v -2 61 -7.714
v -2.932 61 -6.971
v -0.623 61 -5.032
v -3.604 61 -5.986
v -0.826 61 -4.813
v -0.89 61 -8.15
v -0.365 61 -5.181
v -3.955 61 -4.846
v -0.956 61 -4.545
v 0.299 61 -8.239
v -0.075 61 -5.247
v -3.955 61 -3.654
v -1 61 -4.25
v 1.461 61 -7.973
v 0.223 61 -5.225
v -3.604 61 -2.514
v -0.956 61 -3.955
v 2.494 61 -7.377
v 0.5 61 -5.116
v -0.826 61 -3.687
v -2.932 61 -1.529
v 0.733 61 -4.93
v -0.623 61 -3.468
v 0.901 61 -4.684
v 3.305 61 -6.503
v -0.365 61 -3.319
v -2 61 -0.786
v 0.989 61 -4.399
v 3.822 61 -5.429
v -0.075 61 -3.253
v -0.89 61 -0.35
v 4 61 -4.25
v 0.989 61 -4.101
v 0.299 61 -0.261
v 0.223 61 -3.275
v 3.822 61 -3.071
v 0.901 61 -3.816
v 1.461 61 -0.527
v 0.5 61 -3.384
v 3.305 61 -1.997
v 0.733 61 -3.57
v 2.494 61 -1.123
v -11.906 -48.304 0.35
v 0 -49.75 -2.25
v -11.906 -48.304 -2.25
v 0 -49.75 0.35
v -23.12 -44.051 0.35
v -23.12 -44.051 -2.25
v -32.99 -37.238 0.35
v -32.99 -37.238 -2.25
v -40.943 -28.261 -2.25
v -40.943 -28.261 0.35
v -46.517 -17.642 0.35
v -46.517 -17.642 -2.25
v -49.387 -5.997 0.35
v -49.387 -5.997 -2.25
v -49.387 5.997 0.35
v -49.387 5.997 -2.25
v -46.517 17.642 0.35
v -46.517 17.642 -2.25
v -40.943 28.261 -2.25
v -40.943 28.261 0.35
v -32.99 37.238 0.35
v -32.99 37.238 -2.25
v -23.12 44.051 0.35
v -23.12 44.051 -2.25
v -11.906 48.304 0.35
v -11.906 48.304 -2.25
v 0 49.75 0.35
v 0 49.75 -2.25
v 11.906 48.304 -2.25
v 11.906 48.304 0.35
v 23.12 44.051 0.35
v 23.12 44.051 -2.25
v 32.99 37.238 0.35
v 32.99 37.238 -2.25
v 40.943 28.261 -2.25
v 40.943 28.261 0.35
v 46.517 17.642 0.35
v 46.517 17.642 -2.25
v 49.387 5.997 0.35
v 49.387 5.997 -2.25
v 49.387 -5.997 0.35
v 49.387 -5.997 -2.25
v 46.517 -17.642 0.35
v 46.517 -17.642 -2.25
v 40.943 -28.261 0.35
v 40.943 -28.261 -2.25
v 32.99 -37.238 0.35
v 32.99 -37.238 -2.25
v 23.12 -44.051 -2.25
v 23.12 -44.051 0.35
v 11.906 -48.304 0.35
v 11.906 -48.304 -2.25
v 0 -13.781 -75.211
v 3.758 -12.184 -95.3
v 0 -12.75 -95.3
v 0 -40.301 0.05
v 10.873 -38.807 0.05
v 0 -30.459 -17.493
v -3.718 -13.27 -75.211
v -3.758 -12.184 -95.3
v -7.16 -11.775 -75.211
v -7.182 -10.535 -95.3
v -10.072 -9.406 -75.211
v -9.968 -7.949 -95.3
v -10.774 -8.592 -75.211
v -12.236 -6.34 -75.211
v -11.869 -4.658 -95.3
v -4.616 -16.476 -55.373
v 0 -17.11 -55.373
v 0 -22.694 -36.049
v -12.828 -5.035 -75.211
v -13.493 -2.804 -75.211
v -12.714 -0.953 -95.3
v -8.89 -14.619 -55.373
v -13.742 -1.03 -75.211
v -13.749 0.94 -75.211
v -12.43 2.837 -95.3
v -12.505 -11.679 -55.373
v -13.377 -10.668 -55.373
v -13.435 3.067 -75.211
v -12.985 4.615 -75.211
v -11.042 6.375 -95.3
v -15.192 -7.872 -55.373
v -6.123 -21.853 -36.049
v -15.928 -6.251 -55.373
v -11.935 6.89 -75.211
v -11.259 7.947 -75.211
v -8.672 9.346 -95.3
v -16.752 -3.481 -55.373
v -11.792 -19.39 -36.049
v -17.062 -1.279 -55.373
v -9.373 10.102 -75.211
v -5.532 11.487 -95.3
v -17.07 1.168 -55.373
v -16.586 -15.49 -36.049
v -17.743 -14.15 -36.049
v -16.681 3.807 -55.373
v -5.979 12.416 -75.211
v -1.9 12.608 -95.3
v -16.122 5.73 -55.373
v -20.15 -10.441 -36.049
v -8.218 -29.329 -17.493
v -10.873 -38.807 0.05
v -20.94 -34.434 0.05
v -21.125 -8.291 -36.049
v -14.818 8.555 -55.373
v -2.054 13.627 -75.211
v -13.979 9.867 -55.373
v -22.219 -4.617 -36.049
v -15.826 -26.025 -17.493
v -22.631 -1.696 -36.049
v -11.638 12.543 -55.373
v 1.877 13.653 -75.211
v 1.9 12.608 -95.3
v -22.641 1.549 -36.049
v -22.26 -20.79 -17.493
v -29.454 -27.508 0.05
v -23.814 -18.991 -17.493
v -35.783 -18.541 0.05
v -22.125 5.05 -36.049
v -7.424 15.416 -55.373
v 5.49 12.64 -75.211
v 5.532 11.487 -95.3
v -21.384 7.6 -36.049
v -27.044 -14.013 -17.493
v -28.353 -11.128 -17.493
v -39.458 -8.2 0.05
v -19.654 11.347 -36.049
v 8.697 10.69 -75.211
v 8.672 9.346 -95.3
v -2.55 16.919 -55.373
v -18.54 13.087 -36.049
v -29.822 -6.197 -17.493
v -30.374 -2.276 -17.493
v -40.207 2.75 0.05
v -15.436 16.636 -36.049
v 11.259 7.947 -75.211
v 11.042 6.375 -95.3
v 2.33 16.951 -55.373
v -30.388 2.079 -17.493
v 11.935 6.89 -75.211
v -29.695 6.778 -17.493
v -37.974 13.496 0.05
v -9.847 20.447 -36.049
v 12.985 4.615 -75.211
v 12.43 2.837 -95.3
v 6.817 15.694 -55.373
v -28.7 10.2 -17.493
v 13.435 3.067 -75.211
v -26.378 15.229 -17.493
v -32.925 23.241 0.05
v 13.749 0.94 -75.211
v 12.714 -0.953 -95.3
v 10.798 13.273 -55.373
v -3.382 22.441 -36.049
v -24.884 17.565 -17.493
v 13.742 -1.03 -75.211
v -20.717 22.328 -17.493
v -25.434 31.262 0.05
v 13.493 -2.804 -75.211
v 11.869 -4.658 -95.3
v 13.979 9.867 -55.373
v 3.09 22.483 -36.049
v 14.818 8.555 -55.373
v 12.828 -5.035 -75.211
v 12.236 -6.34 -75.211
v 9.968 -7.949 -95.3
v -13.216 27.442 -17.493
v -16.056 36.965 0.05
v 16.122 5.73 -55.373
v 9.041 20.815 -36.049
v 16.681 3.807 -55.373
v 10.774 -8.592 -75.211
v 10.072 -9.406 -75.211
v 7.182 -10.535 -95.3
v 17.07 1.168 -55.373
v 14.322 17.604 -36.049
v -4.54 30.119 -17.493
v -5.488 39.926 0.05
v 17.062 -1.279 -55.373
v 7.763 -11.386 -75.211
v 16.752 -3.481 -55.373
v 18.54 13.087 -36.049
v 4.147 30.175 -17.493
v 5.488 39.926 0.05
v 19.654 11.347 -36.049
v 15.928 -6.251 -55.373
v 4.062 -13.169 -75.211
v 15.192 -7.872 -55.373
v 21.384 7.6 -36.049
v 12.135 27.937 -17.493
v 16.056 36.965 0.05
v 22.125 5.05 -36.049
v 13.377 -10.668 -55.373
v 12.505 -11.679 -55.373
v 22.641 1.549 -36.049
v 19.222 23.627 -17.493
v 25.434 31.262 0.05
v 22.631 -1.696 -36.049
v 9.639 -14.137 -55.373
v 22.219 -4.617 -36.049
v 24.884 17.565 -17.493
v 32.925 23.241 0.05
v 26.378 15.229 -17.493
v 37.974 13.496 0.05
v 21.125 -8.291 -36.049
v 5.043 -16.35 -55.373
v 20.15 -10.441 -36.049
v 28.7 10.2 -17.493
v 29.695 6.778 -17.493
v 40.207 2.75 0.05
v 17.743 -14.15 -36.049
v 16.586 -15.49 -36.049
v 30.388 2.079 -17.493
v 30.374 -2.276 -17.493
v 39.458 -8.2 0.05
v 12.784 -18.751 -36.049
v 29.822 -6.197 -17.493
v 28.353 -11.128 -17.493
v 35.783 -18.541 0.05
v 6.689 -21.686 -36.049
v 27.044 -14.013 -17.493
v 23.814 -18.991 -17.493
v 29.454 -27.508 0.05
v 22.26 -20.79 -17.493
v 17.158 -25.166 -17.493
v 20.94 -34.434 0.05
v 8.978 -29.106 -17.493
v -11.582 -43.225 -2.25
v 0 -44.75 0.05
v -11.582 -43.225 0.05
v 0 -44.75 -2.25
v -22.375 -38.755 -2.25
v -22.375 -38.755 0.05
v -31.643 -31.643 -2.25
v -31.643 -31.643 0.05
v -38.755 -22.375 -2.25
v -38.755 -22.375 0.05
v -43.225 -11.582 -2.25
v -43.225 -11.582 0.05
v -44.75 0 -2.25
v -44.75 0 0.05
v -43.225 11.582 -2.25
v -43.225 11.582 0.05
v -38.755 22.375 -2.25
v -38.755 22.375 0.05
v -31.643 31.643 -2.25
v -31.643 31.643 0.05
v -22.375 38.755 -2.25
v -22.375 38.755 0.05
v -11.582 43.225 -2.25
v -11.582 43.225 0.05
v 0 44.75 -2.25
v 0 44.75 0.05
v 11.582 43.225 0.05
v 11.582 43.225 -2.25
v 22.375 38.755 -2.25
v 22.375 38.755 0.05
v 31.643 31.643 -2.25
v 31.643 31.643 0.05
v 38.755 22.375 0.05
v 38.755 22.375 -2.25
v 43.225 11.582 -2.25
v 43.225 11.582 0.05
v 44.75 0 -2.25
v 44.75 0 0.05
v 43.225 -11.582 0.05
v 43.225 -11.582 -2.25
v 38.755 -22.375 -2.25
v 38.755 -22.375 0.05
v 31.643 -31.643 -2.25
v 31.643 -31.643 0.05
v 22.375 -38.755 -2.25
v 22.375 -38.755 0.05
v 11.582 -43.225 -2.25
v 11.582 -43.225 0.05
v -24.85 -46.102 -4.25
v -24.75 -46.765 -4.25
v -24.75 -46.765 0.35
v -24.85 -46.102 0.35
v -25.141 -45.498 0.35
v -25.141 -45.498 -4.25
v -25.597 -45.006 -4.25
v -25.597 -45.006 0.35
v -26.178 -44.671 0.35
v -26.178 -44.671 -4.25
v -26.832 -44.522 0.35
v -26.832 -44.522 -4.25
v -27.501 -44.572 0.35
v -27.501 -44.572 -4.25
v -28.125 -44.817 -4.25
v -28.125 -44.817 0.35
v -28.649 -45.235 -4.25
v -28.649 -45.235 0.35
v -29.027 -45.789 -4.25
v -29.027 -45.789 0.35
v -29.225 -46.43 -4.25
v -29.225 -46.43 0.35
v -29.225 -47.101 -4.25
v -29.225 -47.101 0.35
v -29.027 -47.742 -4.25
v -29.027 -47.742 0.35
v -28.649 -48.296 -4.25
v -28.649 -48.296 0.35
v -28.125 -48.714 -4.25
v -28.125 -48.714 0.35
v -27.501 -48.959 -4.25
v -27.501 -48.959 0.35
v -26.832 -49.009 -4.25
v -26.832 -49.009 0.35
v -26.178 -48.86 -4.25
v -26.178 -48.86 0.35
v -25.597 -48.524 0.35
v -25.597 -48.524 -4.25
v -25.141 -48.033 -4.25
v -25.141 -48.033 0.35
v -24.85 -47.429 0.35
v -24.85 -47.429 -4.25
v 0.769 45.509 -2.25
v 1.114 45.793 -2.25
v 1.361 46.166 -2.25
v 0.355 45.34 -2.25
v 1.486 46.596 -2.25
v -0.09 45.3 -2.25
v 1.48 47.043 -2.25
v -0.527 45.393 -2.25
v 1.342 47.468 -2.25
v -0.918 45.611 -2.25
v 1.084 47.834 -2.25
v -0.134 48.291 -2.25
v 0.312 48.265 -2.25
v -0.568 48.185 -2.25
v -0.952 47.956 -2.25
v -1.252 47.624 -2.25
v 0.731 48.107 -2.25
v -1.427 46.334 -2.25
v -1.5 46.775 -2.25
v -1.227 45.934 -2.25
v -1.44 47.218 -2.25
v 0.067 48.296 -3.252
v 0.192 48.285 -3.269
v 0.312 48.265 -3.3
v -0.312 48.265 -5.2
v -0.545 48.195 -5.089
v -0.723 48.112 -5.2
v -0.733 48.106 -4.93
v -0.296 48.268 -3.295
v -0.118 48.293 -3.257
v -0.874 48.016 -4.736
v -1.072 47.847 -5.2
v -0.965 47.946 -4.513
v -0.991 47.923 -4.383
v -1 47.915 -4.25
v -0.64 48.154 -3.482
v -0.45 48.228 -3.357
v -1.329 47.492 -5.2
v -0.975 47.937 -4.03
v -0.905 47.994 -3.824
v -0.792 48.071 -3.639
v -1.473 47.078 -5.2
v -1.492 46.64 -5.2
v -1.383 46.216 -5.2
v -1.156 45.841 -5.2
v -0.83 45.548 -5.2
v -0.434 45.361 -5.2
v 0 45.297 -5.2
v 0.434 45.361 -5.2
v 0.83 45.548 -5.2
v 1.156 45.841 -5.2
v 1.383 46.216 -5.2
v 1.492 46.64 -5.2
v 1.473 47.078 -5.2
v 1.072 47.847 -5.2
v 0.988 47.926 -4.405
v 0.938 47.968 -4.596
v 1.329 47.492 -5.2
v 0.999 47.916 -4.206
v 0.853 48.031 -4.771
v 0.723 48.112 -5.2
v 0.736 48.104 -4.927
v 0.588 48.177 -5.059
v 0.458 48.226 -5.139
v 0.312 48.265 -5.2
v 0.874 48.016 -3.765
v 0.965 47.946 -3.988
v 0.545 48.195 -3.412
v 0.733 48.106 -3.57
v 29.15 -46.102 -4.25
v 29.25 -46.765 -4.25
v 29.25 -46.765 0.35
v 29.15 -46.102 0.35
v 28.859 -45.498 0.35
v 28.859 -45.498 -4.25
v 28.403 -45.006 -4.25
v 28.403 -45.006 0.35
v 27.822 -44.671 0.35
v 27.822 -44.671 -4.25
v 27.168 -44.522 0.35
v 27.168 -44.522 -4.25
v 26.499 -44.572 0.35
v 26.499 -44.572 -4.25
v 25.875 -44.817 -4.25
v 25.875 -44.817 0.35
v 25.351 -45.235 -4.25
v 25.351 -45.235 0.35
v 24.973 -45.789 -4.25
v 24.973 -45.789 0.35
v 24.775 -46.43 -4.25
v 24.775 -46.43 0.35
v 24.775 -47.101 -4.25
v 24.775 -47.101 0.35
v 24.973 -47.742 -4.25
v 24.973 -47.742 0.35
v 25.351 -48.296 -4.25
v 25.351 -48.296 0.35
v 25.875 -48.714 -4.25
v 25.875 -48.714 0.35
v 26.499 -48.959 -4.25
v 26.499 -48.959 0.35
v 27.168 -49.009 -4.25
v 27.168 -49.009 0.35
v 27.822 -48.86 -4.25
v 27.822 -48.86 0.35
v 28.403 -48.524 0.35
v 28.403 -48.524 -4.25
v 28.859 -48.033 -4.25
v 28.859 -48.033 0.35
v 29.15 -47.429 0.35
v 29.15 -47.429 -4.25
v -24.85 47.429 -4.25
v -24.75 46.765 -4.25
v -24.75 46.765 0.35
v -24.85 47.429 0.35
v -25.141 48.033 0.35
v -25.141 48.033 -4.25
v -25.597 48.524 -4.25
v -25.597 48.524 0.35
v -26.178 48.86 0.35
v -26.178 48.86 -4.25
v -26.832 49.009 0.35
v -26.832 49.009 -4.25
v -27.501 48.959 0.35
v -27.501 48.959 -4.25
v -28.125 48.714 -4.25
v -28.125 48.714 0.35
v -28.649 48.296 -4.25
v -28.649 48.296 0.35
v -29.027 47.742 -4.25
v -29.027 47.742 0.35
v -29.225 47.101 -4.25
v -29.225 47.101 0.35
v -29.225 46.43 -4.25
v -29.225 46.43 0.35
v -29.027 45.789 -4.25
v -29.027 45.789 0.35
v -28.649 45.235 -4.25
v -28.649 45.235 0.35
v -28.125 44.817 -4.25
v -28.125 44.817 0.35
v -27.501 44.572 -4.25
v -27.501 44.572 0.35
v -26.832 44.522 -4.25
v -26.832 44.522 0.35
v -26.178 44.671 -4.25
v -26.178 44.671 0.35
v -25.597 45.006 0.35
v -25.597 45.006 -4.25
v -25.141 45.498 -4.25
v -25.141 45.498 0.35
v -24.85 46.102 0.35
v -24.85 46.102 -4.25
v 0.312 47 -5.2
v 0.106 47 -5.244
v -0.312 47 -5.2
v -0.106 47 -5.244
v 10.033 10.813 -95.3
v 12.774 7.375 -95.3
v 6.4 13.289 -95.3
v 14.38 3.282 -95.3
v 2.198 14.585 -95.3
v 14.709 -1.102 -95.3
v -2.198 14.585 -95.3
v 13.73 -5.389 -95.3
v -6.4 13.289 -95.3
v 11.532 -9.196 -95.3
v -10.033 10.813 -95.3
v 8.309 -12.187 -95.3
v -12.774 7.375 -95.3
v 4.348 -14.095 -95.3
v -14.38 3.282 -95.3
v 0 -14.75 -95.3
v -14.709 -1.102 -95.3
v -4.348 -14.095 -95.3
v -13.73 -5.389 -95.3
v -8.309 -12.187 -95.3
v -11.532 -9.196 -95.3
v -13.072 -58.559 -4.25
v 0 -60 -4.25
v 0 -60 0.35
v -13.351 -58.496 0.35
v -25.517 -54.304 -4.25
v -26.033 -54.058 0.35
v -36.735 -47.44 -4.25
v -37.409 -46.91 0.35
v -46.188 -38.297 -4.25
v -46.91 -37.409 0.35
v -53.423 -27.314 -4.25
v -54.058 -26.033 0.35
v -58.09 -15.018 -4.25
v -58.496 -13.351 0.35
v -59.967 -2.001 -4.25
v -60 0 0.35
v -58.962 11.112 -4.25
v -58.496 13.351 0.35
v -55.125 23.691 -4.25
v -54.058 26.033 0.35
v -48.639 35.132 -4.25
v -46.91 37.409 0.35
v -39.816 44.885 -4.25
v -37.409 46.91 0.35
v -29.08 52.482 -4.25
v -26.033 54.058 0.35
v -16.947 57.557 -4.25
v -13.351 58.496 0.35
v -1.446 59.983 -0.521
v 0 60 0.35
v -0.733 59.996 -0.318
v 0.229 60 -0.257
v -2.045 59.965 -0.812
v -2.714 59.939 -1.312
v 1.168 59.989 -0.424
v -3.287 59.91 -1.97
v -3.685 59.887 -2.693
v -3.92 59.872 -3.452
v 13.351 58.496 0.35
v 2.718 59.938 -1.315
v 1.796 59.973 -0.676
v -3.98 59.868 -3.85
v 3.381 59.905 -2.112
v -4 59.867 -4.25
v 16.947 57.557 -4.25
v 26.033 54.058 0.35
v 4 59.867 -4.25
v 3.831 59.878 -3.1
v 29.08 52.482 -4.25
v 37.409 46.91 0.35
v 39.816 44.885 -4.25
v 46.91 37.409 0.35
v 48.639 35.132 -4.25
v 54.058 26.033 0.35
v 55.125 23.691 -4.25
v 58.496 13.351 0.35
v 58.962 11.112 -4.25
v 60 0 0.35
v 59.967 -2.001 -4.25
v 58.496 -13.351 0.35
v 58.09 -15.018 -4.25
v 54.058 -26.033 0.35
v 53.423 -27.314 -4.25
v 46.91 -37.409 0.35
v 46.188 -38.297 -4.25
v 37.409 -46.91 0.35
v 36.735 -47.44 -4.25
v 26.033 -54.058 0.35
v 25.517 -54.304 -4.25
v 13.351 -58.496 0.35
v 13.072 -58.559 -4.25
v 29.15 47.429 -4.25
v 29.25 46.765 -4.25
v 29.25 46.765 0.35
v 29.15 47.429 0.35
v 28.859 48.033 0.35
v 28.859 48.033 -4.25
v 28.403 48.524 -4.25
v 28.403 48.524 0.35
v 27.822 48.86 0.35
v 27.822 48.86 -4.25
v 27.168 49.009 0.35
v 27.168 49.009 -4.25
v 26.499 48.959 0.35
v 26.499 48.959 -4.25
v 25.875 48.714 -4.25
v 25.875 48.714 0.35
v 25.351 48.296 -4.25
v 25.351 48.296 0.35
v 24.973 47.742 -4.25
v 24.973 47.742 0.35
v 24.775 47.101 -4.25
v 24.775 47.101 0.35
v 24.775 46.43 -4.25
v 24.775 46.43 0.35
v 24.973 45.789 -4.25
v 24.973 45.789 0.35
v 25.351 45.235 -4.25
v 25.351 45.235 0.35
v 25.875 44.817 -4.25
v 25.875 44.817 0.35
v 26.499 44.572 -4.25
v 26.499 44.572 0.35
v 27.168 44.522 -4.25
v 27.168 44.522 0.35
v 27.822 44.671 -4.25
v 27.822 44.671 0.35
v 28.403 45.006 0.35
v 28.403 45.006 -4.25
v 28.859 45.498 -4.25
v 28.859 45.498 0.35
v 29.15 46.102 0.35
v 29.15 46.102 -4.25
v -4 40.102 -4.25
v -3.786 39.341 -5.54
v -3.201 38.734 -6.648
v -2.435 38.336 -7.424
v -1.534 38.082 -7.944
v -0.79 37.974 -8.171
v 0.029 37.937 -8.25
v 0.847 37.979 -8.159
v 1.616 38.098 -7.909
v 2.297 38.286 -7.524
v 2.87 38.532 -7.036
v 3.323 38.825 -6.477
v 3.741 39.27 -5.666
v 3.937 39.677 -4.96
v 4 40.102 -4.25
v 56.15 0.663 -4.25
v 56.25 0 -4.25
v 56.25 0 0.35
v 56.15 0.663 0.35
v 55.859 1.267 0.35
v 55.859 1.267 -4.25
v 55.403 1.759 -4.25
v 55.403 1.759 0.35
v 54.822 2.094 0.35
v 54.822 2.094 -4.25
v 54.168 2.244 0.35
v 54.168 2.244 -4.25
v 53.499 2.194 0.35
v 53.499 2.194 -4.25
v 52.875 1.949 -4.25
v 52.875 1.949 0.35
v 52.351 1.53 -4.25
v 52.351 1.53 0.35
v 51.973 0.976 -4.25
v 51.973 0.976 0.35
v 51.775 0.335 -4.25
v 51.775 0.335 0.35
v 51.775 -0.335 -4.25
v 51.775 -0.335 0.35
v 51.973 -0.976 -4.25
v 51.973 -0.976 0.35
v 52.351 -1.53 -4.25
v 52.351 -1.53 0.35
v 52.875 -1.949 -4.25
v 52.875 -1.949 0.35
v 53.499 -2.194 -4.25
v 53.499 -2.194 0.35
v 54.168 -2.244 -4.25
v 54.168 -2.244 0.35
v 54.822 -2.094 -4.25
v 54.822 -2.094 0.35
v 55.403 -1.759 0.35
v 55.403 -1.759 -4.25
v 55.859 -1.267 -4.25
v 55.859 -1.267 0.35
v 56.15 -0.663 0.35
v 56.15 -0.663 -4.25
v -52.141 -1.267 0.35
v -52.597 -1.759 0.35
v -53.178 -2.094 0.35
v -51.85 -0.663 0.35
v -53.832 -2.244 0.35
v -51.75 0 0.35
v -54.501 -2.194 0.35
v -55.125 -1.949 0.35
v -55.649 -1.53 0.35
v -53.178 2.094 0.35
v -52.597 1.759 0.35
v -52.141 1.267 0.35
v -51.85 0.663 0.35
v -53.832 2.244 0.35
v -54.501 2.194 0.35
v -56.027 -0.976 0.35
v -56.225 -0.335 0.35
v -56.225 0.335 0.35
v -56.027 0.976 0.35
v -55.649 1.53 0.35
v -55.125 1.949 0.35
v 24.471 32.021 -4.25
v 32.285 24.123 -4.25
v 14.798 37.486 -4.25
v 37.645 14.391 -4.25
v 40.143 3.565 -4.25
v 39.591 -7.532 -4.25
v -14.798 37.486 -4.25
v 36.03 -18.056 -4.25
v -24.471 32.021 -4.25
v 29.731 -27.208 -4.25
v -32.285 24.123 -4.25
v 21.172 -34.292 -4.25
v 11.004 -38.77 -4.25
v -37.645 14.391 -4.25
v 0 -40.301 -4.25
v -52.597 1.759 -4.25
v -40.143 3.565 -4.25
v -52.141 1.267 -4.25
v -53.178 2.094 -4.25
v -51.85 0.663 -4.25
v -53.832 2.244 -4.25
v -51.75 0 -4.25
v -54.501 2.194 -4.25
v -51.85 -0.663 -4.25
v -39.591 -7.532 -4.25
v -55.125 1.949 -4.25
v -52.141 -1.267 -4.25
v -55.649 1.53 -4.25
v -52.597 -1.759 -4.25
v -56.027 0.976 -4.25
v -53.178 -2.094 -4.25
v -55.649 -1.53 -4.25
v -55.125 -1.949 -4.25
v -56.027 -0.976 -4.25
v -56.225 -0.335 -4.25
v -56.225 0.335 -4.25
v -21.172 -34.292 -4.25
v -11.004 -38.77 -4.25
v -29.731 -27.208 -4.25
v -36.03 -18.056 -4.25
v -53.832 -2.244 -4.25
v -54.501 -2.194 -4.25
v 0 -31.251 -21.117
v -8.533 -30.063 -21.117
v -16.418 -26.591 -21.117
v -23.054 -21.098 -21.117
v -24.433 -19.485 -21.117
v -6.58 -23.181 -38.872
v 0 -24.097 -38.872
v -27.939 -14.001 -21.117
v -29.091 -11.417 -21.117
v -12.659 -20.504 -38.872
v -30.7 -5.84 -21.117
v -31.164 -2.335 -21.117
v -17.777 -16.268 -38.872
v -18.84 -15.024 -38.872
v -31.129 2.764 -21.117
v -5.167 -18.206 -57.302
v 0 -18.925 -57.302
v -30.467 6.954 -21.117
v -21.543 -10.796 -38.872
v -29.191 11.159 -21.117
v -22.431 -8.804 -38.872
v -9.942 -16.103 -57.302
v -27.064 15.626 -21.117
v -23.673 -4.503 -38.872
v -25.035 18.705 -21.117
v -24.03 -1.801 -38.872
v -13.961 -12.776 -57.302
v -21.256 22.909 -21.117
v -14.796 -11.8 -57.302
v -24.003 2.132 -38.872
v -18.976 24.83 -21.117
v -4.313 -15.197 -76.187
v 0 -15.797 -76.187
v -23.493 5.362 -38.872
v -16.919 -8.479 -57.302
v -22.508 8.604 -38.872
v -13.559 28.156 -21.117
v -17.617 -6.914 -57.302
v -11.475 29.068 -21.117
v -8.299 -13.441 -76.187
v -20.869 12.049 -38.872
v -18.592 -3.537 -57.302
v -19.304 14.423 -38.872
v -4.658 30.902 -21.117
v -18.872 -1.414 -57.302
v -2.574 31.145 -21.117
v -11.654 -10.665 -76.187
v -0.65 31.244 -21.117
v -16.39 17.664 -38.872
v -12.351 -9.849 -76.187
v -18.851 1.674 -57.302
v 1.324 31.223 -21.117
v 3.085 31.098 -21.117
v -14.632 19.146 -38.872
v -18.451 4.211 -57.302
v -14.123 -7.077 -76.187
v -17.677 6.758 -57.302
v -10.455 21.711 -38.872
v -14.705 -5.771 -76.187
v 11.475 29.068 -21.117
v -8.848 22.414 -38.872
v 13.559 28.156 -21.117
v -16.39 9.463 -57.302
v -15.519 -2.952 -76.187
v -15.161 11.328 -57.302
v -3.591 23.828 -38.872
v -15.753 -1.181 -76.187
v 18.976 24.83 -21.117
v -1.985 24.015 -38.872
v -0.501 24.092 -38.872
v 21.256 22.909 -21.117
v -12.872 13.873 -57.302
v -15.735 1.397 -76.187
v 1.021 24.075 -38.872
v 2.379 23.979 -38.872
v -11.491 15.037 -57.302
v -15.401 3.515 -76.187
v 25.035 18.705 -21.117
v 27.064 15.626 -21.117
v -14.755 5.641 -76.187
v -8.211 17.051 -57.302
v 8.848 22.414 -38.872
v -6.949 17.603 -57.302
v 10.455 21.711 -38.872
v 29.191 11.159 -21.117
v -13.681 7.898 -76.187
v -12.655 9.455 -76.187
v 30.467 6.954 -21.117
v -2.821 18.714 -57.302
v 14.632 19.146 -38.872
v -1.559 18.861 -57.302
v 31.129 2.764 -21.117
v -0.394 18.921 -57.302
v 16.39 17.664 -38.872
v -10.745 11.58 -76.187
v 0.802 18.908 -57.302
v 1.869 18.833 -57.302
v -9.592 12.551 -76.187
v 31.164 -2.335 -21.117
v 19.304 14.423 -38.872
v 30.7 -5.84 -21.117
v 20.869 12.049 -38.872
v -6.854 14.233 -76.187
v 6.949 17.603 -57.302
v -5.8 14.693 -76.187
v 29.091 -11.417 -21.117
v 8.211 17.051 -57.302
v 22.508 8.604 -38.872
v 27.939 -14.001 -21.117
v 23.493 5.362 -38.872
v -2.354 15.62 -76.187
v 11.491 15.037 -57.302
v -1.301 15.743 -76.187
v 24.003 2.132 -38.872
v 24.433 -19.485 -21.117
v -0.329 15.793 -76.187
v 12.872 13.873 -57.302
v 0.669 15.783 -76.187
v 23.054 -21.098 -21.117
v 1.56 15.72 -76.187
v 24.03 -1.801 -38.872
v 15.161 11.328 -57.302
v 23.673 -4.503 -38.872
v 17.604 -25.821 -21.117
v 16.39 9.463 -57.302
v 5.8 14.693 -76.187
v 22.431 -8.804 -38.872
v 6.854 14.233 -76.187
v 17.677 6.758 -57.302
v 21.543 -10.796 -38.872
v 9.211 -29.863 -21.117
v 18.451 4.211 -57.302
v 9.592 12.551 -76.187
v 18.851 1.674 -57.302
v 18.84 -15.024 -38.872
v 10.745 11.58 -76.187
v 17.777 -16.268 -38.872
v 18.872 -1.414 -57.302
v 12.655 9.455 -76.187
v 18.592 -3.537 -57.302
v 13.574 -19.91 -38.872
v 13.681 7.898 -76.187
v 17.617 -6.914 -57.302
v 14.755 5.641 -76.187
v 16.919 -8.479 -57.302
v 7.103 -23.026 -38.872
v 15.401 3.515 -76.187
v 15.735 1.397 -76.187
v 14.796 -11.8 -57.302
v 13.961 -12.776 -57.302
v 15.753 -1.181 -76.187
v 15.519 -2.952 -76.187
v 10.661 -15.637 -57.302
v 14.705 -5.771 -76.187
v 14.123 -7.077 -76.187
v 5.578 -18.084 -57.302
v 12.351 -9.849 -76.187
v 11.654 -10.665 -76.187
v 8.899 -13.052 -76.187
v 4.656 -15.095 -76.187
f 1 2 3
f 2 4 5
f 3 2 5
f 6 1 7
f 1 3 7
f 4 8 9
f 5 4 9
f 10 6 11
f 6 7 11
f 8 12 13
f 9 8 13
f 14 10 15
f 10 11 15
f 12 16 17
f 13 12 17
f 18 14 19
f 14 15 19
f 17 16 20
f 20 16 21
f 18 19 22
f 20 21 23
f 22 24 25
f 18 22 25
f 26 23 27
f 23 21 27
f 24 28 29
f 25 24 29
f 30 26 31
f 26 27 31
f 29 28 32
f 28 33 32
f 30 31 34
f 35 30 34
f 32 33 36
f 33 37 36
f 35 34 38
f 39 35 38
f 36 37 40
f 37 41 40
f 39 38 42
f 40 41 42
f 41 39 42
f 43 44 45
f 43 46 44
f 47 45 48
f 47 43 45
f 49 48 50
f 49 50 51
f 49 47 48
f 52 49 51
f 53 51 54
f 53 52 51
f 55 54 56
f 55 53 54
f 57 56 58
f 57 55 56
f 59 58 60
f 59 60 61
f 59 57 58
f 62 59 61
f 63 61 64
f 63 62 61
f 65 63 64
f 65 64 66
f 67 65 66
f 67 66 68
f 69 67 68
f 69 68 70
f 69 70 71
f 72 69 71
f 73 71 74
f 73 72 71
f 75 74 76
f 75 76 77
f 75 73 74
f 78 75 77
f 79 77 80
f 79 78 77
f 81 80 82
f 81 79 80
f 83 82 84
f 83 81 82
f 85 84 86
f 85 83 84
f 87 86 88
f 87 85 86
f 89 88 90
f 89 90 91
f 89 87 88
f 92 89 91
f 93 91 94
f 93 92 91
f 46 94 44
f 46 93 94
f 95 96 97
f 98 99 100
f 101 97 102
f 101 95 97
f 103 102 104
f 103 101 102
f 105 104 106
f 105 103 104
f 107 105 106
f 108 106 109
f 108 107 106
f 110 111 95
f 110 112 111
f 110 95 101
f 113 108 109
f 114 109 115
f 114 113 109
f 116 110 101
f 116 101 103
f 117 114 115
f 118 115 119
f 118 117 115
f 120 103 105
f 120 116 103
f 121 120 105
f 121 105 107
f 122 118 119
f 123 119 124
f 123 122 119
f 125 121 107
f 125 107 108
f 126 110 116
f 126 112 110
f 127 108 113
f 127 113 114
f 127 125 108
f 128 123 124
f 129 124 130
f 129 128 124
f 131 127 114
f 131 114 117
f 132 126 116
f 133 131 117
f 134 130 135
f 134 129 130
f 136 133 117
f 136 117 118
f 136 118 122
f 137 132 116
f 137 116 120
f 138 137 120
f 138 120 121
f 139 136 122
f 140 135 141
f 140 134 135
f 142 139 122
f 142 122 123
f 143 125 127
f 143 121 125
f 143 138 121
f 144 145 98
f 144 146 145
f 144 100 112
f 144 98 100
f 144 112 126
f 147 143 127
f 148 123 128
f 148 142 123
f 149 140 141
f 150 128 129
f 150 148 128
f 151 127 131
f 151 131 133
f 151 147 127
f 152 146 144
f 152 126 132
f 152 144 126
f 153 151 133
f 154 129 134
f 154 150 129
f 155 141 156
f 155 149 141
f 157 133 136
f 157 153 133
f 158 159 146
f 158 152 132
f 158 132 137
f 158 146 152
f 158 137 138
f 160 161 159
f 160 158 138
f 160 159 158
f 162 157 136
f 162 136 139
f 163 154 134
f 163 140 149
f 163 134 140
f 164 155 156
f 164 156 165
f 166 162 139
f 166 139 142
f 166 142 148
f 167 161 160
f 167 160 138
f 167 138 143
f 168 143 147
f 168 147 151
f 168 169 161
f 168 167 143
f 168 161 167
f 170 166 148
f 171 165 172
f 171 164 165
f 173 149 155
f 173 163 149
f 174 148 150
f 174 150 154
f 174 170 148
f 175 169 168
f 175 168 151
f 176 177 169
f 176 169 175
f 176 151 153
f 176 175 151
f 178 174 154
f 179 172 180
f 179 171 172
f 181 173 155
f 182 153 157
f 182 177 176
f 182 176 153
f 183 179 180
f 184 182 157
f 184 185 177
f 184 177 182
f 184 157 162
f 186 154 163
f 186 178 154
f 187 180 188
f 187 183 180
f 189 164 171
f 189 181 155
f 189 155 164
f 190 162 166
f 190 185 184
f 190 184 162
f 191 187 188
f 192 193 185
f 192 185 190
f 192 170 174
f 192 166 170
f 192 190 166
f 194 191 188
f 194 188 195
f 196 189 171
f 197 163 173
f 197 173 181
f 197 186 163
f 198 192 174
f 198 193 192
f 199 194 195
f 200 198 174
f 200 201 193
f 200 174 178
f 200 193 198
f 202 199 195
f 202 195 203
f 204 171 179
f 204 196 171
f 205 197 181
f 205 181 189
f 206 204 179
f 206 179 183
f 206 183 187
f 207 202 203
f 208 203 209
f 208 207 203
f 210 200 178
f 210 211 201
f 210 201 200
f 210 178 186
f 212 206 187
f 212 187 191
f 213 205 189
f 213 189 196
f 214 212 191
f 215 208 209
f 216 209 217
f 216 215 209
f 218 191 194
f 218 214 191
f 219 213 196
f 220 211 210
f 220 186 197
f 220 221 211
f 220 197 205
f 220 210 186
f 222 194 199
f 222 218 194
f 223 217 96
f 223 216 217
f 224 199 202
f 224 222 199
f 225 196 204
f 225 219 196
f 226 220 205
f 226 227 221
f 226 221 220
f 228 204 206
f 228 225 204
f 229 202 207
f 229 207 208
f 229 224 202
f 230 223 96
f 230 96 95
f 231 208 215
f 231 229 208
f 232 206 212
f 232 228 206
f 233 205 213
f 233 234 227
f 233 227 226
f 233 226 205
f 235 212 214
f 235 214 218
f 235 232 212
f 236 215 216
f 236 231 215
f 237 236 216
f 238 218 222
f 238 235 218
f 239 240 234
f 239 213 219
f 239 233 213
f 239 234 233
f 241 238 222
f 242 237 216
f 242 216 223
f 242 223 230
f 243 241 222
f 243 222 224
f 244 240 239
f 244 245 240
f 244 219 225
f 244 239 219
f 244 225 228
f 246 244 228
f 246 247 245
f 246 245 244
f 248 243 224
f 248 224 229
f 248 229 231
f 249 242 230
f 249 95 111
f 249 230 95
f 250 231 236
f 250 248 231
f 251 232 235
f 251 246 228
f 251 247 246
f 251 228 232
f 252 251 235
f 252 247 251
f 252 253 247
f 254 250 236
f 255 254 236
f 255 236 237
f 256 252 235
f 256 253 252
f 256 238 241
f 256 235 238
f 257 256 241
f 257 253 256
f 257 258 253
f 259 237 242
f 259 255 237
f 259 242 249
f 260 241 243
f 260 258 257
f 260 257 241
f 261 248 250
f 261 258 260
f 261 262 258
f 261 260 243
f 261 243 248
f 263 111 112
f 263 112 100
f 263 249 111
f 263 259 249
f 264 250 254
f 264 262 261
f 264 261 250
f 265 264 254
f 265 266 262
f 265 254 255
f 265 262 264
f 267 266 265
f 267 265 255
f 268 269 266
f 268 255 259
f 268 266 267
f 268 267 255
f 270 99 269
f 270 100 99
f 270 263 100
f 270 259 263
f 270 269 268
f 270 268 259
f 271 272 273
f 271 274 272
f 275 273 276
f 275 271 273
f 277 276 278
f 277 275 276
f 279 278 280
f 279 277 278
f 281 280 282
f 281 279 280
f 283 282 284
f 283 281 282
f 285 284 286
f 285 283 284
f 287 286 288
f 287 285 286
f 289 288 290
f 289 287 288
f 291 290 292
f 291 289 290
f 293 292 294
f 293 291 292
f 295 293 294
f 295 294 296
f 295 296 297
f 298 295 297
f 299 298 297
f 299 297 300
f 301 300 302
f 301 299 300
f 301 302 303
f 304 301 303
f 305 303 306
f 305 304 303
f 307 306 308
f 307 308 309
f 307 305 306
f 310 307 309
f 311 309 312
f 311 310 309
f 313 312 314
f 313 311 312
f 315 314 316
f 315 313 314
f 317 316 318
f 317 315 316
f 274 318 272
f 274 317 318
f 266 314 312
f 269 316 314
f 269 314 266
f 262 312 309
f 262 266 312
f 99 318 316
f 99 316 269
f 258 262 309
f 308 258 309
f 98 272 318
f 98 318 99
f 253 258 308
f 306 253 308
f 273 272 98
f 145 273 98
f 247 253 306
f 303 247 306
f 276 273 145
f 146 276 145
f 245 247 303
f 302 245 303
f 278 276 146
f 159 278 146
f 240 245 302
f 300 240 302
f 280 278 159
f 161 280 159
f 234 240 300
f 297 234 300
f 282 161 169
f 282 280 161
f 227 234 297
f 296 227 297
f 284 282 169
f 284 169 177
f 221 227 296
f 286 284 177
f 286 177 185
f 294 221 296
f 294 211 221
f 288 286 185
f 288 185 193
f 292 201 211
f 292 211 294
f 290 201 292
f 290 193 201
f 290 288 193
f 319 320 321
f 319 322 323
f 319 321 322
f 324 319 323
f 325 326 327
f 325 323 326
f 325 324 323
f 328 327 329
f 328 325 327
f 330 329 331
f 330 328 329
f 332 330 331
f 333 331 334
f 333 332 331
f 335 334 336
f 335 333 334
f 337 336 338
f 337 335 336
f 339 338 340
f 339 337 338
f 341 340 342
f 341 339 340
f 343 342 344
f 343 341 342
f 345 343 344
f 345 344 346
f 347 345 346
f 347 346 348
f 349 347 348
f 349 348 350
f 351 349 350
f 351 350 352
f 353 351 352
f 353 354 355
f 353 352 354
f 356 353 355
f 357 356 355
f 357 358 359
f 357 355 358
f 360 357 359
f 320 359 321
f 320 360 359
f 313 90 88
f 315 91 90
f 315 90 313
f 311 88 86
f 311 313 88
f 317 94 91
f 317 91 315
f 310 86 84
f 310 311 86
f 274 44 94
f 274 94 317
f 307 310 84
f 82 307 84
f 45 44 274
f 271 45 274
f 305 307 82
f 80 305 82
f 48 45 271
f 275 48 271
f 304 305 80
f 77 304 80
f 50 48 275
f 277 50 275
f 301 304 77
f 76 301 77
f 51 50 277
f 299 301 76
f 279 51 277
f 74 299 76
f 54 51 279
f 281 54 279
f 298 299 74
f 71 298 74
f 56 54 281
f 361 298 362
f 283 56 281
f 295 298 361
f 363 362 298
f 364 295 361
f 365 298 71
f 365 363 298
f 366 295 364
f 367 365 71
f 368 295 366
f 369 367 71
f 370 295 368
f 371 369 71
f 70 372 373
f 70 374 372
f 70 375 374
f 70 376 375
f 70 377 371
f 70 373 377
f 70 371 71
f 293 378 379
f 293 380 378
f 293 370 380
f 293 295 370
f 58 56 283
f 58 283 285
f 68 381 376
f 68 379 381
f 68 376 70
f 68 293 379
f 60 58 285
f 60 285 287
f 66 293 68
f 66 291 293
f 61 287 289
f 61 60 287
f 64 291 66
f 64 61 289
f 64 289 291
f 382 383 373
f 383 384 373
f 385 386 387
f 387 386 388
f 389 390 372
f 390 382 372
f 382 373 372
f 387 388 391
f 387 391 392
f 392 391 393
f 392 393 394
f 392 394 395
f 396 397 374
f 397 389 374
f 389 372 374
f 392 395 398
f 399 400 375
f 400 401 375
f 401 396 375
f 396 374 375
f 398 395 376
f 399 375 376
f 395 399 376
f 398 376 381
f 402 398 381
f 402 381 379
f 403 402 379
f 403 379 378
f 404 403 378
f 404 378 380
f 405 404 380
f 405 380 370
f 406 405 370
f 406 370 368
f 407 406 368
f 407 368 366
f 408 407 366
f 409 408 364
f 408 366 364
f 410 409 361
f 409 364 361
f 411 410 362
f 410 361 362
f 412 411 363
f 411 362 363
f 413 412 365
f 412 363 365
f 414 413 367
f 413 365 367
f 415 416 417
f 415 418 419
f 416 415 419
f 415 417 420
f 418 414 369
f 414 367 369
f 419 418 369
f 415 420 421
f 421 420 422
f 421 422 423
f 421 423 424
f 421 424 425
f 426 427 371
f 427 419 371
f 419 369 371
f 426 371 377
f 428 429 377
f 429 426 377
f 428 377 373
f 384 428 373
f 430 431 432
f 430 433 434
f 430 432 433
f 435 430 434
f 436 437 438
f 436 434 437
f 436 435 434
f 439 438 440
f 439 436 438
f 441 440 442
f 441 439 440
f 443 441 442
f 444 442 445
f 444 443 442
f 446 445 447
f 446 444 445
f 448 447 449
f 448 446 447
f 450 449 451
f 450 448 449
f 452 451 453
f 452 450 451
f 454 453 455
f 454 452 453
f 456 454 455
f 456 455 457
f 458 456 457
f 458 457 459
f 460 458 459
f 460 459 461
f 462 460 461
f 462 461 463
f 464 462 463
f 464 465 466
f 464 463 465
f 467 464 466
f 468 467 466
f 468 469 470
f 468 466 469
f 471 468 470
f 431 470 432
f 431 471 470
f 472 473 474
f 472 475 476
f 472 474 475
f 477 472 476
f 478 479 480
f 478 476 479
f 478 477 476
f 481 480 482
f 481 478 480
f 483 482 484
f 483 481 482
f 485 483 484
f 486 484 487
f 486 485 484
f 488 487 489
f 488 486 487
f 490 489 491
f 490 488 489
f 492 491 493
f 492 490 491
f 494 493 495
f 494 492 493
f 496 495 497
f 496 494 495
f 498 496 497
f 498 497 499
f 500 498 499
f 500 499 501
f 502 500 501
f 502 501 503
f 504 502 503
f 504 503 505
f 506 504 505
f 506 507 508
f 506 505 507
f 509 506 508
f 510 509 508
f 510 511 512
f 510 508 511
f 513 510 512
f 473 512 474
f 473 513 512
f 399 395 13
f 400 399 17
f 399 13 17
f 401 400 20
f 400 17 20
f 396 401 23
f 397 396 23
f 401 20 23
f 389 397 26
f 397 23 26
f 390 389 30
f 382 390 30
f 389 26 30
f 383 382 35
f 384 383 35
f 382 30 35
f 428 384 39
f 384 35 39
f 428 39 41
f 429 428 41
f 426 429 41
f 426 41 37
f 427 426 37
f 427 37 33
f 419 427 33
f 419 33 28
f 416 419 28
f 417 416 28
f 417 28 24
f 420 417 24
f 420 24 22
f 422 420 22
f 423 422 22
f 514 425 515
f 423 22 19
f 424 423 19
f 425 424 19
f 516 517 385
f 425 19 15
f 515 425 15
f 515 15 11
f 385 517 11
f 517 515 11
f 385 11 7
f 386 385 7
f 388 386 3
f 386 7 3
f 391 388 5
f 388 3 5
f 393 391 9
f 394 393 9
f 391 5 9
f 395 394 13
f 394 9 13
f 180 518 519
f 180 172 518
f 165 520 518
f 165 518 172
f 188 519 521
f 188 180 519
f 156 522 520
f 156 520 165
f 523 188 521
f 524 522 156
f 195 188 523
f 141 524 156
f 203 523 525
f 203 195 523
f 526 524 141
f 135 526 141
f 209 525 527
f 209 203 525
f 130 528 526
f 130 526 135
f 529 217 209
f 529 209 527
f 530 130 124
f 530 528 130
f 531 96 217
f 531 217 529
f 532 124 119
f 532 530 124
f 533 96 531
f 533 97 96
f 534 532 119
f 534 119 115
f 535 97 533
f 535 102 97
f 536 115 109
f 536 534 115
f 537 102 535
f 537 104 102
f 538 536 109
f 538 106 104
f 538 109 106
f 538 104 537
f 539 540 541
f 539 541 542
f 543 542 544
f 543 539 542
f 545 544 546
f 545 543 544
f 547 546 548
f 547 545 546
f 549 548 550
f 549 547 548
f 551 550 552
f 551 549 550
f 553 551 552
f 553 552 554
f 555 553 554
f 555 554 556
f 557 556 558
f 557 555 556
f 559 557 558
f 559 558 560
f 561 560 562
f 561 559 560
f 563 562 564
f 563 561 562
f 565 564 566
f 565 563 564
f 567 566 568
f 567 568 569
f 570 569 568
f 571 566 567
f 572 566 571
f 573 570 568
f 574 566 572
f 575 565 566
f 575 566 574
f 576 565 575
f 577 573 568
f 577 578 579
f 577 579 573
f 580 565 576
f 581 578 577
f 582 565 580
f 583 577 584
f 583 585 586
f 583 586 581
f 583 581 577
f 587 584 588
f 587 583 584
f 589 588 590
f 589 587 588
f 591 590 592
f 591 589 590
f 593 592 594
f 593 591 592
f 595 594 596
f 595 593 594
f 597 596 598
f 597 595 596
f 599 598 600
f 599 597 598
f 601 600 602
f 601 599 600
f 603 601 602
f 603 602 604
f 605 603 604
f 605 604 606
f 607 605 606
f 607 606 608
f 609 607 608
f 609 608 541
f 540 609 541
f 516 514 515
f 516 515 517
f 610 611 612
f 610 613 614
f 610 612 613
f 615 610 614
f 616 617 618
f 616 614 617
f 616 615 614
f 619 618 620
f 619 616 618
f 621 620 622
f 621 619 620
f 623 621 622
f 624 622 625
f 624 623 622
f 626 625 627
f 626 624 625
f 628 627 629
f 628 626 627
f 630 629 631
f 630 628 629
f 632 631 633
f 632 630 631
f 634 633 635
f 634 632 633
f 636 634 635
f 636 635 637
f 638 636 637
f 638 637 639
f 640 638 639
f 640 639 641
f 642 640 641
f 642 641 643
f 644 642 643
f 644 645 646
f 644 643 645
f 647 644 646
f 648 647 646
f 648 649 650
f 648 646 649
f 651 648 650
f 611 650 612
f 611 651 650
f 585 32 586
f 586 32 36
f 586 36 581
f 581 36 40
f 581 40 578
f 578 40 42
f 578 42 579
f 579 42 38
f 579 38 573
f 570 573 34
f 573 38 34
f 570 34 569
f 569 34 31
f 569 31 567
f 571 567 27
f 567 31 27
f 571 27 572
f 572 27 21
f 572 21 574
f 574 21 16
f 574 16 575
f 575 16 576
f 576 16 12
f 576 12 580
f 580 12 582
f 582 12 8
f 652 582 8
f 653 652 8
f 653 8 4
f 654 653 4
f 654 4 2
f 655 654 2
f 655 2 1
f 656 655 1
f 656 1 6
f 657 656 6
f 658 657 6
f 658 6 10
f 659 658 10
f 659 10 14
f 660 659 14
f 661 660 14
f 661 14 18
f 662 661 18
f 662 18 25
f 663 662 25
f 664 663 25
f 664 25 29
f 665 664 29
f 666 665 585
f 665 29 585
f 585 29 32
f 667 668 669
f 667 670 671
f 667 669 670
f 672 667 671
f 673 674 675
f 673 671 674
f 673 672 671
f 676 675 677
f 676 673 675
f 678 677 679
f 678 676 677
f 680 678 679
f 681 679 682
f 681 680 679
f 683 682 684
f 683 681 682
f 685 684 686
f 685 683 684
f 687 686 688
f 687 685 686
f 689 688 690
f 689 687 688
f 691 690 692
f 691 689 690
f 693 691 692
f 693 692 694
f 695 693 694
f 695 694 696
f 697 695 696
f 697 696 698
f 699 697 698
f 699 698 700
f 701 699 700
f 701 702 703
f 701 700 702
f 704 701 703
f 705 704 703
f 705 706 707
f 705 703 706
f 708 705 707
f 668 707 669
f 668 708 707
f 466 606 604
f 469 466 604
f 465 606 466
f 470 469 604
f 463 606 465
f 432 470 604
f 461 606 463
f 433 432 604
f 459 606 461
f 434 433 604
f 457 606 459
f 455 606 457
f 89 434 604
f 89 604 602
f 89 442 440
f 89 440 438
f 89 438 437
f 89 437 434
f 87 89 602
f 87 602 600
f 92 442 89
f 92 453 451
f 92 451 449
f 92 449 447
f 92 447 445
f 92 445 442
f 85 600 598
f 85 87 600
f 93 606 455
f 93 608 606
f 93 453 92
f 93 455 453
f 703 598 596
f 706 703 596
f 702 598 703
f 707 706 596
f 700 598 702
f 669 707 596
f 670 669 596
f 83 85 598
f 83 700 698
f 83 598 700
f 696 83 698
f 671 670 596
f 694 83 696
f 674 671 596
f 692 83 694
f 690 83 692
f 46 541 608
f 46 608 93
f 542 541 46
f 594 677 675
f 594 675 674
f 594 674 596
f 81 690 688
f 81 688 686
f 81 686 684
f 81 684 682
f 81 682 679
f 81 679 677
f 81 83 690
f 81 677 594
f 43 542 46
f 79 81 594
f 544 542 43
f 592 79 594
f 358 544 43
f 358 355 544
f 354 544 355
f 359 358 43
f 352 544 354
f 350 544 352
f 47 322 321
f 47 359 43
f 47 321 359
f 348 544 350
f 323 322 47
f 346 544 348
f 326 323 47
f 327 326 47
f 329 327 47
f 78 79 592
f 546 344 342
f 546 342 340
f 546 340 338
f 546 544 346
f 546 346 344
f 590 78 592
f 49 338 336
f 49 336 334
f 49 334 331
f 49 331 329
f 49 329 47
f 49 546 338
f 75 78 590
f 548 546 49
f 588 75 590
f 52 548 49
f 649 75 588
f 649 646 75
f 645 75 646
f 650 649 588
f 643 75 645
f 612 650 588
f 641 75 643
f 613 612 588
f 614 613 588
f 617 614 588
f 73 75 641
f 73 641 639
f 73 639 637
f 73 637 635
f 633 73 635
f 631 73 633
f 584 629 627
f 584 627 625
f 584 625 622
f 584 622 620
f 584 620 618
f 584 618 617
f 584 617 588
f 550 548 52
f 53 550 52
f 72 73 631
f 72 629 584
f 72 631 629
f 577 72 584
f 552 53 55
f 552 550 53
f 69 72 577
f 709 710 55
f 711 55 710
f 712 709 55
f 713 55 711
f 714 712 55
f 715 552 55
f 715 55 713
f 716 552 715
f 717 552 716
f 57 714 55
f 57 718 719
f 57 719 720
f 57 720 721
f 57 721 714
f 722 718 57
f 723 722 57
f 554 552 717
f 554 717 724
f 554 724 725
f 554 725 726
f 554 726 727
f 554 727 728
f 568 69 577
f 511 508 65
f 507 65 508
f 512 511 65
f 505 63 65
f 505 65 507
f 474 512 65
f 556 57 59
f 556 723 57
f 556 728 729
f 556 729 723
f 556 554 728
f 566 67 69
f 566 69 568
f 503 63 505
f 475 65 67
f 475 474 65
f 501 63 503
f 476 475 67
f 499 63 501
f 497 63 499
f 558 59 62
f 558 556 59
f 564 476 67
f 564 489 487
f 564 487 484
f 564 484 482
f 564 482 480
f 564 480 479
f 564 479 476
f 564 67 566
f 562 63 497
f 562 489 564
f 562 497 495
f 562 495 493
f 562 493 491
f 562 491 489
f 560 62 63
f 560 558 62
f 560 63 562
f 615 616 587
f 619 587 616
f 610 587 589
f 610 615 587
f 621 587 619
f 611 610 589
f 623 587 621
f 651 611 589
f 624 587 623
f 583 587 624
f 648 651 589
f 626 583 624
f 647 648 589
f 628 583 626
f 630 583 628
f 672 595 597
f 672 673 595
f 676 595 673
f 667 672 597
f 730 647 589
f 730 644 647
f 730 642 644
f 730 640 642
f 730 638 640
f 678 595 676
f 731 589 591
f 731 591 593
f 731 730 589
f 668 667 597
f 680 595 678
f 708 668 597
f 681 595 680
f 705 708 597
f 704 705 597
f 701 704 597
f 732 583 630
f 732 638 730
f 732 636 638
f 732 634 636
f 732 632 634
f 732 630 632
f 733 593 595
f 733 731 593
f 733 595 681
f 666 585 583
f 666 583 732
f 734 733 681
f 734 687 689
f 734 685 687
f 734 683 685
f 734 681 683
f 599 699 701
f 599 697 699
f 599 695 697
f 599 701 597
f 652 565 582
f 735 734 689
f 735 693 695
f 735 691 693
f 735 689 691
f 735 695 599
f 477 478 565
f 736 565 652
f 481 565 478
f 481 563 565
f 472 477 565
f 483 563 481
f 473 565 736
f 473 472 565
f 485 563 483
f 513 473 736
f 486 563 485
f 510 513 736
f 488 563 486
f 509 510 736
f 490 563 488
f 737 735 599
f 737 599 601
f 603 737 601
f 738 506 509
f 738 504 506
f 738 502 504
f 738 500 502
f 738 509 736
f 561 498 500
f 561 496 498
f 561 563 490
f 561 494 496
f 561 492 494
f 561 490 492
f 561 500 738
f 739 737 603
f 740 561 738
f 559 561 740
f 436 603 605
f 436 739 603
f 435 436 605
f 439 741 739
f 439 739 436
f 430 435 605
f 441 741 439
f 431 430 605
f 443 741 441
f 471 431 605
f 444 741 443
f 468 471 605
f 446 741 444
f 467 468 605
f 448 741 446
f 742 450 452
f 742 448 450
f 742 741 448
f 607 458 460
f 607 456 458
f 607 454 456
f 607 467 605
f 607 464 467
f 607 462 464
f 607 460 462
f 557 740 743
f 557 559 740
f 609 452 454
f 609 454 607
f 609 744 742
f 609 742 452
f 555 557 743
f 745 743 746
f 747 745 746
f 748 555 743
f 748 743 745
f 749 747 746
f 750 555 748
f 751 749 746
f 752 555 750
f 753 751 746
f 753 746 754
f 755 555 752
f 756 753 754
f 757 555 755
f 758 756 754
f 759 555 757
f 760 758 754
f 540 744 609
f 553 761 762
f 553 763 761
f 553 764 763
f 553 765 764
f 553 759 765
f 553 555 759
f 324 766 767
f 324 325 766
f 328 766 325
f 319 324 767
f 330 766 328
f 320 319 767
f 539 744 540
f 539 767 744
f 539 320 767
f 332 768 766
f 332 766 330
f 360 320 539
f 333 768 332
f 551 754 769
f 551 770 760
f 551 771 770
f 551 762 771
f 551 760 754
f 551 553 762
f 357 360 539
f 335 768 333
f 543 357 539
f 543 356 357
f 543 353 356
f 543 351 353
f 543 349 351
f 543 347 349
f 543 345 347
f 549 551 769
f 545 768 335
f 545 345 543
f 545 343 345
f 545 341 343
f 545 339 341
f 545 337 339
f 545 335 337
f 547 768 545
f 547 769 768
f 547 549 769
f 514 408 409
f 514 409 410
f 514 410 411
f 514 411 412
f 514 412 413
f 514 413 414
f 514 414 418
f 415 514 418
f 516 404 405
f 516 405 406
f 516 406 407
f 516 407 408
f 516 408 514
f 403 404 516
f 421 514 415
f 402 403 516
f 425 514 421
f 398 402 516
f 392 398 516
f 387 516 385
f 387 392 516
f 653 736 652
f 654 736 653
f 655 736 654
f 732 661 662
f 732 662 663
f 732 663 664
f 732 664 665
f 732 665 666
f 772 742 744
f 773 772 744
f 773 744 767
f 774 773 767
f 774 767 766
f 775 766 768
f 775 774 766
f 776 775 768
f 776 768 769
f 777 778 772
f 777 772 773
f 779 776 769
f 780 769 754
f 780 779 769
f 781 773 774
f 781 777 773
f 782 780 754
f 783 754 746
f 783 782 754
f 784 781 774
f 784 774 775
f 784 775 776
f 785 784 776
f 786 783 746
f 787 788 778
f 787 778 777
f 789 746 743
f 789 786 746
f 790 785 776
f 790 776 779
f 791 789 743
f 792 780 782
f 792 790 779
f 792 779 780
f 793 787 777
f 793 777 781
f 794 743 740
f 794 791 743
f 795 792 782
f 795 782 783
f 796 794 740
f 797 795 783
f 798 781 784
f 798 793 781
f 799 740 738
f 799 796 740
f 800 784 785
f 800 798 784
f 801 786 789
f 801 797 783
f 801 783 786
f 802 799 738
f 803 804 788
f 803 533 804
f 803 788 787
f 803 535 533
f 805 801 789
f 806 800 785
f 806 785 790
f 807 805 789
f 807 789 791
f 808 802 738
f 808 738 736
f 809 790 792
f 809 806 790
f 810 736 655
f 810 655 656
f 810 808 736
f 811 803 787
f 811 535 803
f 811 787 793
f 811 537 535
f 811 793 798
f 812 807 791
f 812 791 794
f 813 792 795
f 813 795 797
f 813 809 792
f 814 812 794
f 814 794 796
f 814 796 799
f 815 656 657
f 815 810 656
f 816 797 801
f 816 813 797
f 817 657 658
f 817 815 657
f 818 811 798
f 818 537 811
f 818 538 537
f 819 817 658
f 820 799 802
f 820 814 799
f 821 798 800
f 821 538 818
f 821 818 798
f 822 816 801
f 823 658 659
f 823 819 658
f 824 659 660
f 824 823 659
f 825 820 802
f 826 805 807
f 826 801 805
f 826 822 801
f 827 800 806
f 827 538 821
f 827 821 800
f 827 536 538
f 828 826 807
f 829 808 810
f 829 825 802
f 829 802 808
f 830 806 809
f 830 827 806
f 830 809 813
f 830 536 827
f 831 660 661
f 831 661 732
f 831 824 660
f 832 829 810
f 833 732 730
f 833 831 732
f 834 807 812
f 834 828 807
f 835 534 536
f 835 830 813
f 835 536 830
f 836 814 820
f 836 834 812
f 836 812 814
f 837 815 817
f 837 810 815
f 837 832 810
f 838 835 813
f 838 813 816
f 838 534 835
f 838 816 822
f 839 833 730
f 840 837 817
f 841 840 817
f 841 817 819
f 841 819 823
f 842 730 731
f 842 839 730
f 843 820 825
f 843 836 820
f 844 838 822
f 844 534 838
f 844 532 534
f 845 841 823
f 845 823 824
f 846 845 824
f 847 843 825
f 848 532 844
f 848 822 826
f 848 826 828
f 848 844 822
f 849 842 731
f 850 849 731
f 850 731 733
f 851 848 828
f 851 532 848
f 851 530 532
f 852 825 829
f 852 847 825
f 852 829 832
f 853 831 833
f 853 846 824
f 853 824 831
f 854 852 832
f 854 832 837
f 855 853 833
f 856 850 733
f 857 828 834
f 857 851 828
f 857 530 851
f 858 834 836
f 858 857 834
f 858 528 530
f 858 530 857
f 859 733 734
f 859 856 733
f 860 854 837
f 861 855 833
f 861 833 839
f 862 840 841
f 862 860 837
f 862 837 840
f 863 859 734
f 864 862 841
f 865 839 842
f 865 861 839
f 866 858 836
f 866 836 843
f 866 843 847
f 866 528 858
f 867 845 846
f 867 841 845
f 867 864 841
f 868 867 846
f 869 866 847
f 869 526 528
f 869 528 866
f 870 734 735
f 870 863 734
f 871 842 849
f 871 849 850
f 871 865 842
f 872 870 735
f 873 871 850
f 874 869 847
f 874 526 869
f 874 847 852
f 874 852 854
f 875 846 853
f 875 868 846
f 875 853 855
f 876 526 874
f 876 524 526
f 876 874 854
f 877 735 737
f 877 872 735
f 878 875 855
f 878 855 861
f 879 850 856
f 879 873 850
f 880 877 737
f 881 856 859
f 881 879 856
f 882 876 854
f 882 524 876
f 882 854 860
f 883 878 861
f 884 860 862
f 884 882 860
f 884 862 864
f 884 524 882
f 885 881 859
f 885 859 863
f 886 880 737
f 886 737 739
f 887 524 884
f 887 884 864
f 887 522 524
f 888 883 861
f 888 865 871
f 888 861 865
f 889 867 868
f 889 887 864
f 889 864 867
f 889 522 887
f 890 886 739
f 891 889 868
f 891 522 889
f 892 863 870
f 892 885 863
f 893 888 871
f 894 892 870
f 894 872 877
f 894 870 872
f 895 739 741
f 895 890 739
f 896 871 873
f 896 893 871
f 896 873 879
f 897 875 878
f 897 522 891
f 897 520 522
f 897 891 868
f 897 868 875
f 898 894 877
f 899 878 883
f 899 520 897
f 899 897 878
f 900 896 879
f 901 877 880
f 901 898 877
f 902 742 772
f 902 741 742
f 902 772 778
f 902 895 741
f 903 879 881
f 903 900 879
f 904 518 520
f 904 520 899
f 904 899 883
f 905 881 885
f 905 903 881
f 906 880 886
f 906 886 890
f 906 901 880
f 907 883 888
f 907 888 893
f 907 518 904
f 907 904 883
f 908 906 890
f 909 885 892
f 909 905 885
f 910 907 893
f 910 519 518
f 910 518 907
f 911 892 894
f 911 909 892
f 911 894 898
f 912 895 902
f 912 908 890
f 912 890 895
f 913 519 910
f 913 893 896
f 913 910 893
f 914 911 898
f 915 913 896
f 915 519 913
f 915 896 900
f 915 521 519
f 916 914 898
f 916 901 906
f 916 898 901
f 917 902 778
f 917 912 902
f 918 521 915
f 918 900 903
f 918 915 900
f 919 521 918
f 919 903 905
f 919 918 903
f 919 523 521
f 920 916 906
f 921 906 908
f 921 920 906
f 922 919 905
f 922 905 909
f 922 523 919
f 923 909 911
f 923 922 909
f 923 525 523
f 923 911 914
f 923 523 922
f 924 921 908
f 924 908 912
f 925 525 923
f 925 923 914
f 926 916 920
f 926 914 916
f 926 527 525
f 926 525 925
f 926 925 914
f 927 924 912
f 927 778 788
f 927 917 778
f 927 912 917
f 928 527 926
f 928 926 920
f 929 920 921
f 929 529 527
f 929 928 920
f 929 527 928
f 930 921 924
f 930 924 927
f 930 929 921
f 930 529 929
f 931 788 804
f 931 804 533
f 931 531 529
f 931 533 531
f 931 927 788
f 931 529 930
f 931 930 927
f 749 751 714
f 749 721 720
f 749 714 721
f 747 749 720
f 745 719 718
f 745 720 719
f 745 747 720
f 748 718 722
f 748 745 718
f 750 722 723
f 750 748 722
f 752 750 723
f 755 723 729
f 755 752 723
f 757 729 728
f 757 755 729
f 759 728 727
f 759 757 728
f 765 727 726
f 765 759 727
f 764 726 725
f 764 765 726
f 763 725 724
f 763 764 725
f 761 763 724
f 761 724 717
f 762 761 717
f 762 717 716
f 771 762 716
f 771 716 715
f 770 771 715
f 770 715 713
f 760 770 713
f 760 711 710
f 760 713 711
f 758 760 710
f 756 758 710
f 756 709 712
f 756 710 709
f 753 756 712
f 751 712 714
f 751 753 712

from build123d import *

# Parameters (mm, degrees)
BOSS_EXTRUDE1_REACH     = 167.297
SKETCH3_R               = 4
SKETCH4_R               = 1
CUT_EXTRUDE1_DEPTH      = 14
SKETCH5_R               = 1.5
CUT_EXTRUDE2_DEPTH      = 5.2
CUT_EXTRUDE3_DEPTH      = 129.074548772
CUT_EXTRUDE3_DEPTH_BACK = 129.074548772
SKETCH6_R               = 2.25


with BuildPart() as part:
    # Sketch2 → Revolve1 (revolve)
    with BuildSketch(Plane(origin=(0, 0, 0), x_dir=(0, 0, -1), z_dir=(1, 0, 0)), mode=Mode.PRIVATE) as revolve1_sk:
        with BuildLine():
            Line((95.3, 14.75), (95.3, 12.75))
            ThreePointArc((95.3, 12.75), (45.630862999, 19.624348561), (-0.05, 40.301354974))
            Line((-0.05, 40.301354974), (-0.05, 44.75))
            Line((-0.05, 44.75), (2.25, 44.75))
            Line((2.25, 44.75), (2.25, 49.75))
            Line((2.25, 49.75), (-0.35, 49.75))
            Line((-0.35, 49.75), (-0.35, 60))
            Line((-0.35, 60), (4.25, 60))
            Line((4.25, 60), (4.25, 40.301354974))
            ThreePointArc((4.25, 40.301354974), (48.016349969, 21.258883202), (95.3, 14.75))
        make_face()
    revolve(revolve1_sk.sketch.rotate(Axis((0, 0, 95.3), (0, 0, -1)), 180), axis=Axis((0, 0, 95.3), (0, 0, -1)))

    # Sketch3 → Boss-Extrude1 (add, up to next)
    with BuildSketch(Plane(origin=(0, 61, 0), x_dir=(-1, 0, 0), z_dir=(0, -1, 0)), mode=Mode.PRIVATE) as boss_extrude1_sk1:
        with Locations(Location((0, 4.25, 0), (0, 0, 180))):
            Circle(SKETCH3_R)
    boss_extrude1_tool1 = extrude(boss_extrude1_sk1.sketch, amount=BOSS_EXTRUDE1_REACH, mode=Mode.PRIVATE) - part.part
    add(boss_extrude1_tool1.solids().sort_by_distance((0, 61, -4.25))[0])

    # Sketch4 → Cut-Extrude1 (cut)
    with BuildSketch(Plane(origin=(0, 61, 0), x_dir=(1, 0, 0), z_dir=(0, 1, 0))):
        with Locations(Location((0, 4.25, 0), (0, 0, 180))):
            Circle(SKETCH4_R)
    extrude(amount=-CUT_EXTRUDE1_DEPTH, mode=Mode.SUBTRACT)

    # Sketch5 → Cut-Extrude2 (cut)
    with BuildSketch(Plane.XY):
        with Locations(Location((0, 46.797368966, 0), (0, 0, 77.98506808))):
            Circle(SKETCH5_R)
    extrude(amount=-CUT_EXTRUDE2_DEPTH, mode=Mode.SUBTRACT)

    # Sketch6 → Cut-Extrude3 (cut, two sides: drawn at the far end of the back side and taken through both)
    with BuildSketch(Plane.XY.offset(-CUT_EXTRUDE3_DEPTH_BACK)):
        with Locations((54, 0)):
            Circle(SKETCH6_R)
        with Locations((27, -46.765371804)):
            Circle(SKETCH6_R)
        with Locations((-27, -46.765371804)):
            Circle(SKETCH6_R)
        with Locations((-54, 0)):
            Circle(SKETCH6_R)
        with Locations((-27, 46.765371804)):
            Circle(SKETCH6_R)
        with Locations((27, 46.765371804)):
            Circle(SKETCH6_R)
    extrude(amount=CUT_EXTRUDE3_DEPTH + CUT_EXTRUDE3_DEPTH_BACK, mode=Mode.SUBTRACT)


solid = part.part
